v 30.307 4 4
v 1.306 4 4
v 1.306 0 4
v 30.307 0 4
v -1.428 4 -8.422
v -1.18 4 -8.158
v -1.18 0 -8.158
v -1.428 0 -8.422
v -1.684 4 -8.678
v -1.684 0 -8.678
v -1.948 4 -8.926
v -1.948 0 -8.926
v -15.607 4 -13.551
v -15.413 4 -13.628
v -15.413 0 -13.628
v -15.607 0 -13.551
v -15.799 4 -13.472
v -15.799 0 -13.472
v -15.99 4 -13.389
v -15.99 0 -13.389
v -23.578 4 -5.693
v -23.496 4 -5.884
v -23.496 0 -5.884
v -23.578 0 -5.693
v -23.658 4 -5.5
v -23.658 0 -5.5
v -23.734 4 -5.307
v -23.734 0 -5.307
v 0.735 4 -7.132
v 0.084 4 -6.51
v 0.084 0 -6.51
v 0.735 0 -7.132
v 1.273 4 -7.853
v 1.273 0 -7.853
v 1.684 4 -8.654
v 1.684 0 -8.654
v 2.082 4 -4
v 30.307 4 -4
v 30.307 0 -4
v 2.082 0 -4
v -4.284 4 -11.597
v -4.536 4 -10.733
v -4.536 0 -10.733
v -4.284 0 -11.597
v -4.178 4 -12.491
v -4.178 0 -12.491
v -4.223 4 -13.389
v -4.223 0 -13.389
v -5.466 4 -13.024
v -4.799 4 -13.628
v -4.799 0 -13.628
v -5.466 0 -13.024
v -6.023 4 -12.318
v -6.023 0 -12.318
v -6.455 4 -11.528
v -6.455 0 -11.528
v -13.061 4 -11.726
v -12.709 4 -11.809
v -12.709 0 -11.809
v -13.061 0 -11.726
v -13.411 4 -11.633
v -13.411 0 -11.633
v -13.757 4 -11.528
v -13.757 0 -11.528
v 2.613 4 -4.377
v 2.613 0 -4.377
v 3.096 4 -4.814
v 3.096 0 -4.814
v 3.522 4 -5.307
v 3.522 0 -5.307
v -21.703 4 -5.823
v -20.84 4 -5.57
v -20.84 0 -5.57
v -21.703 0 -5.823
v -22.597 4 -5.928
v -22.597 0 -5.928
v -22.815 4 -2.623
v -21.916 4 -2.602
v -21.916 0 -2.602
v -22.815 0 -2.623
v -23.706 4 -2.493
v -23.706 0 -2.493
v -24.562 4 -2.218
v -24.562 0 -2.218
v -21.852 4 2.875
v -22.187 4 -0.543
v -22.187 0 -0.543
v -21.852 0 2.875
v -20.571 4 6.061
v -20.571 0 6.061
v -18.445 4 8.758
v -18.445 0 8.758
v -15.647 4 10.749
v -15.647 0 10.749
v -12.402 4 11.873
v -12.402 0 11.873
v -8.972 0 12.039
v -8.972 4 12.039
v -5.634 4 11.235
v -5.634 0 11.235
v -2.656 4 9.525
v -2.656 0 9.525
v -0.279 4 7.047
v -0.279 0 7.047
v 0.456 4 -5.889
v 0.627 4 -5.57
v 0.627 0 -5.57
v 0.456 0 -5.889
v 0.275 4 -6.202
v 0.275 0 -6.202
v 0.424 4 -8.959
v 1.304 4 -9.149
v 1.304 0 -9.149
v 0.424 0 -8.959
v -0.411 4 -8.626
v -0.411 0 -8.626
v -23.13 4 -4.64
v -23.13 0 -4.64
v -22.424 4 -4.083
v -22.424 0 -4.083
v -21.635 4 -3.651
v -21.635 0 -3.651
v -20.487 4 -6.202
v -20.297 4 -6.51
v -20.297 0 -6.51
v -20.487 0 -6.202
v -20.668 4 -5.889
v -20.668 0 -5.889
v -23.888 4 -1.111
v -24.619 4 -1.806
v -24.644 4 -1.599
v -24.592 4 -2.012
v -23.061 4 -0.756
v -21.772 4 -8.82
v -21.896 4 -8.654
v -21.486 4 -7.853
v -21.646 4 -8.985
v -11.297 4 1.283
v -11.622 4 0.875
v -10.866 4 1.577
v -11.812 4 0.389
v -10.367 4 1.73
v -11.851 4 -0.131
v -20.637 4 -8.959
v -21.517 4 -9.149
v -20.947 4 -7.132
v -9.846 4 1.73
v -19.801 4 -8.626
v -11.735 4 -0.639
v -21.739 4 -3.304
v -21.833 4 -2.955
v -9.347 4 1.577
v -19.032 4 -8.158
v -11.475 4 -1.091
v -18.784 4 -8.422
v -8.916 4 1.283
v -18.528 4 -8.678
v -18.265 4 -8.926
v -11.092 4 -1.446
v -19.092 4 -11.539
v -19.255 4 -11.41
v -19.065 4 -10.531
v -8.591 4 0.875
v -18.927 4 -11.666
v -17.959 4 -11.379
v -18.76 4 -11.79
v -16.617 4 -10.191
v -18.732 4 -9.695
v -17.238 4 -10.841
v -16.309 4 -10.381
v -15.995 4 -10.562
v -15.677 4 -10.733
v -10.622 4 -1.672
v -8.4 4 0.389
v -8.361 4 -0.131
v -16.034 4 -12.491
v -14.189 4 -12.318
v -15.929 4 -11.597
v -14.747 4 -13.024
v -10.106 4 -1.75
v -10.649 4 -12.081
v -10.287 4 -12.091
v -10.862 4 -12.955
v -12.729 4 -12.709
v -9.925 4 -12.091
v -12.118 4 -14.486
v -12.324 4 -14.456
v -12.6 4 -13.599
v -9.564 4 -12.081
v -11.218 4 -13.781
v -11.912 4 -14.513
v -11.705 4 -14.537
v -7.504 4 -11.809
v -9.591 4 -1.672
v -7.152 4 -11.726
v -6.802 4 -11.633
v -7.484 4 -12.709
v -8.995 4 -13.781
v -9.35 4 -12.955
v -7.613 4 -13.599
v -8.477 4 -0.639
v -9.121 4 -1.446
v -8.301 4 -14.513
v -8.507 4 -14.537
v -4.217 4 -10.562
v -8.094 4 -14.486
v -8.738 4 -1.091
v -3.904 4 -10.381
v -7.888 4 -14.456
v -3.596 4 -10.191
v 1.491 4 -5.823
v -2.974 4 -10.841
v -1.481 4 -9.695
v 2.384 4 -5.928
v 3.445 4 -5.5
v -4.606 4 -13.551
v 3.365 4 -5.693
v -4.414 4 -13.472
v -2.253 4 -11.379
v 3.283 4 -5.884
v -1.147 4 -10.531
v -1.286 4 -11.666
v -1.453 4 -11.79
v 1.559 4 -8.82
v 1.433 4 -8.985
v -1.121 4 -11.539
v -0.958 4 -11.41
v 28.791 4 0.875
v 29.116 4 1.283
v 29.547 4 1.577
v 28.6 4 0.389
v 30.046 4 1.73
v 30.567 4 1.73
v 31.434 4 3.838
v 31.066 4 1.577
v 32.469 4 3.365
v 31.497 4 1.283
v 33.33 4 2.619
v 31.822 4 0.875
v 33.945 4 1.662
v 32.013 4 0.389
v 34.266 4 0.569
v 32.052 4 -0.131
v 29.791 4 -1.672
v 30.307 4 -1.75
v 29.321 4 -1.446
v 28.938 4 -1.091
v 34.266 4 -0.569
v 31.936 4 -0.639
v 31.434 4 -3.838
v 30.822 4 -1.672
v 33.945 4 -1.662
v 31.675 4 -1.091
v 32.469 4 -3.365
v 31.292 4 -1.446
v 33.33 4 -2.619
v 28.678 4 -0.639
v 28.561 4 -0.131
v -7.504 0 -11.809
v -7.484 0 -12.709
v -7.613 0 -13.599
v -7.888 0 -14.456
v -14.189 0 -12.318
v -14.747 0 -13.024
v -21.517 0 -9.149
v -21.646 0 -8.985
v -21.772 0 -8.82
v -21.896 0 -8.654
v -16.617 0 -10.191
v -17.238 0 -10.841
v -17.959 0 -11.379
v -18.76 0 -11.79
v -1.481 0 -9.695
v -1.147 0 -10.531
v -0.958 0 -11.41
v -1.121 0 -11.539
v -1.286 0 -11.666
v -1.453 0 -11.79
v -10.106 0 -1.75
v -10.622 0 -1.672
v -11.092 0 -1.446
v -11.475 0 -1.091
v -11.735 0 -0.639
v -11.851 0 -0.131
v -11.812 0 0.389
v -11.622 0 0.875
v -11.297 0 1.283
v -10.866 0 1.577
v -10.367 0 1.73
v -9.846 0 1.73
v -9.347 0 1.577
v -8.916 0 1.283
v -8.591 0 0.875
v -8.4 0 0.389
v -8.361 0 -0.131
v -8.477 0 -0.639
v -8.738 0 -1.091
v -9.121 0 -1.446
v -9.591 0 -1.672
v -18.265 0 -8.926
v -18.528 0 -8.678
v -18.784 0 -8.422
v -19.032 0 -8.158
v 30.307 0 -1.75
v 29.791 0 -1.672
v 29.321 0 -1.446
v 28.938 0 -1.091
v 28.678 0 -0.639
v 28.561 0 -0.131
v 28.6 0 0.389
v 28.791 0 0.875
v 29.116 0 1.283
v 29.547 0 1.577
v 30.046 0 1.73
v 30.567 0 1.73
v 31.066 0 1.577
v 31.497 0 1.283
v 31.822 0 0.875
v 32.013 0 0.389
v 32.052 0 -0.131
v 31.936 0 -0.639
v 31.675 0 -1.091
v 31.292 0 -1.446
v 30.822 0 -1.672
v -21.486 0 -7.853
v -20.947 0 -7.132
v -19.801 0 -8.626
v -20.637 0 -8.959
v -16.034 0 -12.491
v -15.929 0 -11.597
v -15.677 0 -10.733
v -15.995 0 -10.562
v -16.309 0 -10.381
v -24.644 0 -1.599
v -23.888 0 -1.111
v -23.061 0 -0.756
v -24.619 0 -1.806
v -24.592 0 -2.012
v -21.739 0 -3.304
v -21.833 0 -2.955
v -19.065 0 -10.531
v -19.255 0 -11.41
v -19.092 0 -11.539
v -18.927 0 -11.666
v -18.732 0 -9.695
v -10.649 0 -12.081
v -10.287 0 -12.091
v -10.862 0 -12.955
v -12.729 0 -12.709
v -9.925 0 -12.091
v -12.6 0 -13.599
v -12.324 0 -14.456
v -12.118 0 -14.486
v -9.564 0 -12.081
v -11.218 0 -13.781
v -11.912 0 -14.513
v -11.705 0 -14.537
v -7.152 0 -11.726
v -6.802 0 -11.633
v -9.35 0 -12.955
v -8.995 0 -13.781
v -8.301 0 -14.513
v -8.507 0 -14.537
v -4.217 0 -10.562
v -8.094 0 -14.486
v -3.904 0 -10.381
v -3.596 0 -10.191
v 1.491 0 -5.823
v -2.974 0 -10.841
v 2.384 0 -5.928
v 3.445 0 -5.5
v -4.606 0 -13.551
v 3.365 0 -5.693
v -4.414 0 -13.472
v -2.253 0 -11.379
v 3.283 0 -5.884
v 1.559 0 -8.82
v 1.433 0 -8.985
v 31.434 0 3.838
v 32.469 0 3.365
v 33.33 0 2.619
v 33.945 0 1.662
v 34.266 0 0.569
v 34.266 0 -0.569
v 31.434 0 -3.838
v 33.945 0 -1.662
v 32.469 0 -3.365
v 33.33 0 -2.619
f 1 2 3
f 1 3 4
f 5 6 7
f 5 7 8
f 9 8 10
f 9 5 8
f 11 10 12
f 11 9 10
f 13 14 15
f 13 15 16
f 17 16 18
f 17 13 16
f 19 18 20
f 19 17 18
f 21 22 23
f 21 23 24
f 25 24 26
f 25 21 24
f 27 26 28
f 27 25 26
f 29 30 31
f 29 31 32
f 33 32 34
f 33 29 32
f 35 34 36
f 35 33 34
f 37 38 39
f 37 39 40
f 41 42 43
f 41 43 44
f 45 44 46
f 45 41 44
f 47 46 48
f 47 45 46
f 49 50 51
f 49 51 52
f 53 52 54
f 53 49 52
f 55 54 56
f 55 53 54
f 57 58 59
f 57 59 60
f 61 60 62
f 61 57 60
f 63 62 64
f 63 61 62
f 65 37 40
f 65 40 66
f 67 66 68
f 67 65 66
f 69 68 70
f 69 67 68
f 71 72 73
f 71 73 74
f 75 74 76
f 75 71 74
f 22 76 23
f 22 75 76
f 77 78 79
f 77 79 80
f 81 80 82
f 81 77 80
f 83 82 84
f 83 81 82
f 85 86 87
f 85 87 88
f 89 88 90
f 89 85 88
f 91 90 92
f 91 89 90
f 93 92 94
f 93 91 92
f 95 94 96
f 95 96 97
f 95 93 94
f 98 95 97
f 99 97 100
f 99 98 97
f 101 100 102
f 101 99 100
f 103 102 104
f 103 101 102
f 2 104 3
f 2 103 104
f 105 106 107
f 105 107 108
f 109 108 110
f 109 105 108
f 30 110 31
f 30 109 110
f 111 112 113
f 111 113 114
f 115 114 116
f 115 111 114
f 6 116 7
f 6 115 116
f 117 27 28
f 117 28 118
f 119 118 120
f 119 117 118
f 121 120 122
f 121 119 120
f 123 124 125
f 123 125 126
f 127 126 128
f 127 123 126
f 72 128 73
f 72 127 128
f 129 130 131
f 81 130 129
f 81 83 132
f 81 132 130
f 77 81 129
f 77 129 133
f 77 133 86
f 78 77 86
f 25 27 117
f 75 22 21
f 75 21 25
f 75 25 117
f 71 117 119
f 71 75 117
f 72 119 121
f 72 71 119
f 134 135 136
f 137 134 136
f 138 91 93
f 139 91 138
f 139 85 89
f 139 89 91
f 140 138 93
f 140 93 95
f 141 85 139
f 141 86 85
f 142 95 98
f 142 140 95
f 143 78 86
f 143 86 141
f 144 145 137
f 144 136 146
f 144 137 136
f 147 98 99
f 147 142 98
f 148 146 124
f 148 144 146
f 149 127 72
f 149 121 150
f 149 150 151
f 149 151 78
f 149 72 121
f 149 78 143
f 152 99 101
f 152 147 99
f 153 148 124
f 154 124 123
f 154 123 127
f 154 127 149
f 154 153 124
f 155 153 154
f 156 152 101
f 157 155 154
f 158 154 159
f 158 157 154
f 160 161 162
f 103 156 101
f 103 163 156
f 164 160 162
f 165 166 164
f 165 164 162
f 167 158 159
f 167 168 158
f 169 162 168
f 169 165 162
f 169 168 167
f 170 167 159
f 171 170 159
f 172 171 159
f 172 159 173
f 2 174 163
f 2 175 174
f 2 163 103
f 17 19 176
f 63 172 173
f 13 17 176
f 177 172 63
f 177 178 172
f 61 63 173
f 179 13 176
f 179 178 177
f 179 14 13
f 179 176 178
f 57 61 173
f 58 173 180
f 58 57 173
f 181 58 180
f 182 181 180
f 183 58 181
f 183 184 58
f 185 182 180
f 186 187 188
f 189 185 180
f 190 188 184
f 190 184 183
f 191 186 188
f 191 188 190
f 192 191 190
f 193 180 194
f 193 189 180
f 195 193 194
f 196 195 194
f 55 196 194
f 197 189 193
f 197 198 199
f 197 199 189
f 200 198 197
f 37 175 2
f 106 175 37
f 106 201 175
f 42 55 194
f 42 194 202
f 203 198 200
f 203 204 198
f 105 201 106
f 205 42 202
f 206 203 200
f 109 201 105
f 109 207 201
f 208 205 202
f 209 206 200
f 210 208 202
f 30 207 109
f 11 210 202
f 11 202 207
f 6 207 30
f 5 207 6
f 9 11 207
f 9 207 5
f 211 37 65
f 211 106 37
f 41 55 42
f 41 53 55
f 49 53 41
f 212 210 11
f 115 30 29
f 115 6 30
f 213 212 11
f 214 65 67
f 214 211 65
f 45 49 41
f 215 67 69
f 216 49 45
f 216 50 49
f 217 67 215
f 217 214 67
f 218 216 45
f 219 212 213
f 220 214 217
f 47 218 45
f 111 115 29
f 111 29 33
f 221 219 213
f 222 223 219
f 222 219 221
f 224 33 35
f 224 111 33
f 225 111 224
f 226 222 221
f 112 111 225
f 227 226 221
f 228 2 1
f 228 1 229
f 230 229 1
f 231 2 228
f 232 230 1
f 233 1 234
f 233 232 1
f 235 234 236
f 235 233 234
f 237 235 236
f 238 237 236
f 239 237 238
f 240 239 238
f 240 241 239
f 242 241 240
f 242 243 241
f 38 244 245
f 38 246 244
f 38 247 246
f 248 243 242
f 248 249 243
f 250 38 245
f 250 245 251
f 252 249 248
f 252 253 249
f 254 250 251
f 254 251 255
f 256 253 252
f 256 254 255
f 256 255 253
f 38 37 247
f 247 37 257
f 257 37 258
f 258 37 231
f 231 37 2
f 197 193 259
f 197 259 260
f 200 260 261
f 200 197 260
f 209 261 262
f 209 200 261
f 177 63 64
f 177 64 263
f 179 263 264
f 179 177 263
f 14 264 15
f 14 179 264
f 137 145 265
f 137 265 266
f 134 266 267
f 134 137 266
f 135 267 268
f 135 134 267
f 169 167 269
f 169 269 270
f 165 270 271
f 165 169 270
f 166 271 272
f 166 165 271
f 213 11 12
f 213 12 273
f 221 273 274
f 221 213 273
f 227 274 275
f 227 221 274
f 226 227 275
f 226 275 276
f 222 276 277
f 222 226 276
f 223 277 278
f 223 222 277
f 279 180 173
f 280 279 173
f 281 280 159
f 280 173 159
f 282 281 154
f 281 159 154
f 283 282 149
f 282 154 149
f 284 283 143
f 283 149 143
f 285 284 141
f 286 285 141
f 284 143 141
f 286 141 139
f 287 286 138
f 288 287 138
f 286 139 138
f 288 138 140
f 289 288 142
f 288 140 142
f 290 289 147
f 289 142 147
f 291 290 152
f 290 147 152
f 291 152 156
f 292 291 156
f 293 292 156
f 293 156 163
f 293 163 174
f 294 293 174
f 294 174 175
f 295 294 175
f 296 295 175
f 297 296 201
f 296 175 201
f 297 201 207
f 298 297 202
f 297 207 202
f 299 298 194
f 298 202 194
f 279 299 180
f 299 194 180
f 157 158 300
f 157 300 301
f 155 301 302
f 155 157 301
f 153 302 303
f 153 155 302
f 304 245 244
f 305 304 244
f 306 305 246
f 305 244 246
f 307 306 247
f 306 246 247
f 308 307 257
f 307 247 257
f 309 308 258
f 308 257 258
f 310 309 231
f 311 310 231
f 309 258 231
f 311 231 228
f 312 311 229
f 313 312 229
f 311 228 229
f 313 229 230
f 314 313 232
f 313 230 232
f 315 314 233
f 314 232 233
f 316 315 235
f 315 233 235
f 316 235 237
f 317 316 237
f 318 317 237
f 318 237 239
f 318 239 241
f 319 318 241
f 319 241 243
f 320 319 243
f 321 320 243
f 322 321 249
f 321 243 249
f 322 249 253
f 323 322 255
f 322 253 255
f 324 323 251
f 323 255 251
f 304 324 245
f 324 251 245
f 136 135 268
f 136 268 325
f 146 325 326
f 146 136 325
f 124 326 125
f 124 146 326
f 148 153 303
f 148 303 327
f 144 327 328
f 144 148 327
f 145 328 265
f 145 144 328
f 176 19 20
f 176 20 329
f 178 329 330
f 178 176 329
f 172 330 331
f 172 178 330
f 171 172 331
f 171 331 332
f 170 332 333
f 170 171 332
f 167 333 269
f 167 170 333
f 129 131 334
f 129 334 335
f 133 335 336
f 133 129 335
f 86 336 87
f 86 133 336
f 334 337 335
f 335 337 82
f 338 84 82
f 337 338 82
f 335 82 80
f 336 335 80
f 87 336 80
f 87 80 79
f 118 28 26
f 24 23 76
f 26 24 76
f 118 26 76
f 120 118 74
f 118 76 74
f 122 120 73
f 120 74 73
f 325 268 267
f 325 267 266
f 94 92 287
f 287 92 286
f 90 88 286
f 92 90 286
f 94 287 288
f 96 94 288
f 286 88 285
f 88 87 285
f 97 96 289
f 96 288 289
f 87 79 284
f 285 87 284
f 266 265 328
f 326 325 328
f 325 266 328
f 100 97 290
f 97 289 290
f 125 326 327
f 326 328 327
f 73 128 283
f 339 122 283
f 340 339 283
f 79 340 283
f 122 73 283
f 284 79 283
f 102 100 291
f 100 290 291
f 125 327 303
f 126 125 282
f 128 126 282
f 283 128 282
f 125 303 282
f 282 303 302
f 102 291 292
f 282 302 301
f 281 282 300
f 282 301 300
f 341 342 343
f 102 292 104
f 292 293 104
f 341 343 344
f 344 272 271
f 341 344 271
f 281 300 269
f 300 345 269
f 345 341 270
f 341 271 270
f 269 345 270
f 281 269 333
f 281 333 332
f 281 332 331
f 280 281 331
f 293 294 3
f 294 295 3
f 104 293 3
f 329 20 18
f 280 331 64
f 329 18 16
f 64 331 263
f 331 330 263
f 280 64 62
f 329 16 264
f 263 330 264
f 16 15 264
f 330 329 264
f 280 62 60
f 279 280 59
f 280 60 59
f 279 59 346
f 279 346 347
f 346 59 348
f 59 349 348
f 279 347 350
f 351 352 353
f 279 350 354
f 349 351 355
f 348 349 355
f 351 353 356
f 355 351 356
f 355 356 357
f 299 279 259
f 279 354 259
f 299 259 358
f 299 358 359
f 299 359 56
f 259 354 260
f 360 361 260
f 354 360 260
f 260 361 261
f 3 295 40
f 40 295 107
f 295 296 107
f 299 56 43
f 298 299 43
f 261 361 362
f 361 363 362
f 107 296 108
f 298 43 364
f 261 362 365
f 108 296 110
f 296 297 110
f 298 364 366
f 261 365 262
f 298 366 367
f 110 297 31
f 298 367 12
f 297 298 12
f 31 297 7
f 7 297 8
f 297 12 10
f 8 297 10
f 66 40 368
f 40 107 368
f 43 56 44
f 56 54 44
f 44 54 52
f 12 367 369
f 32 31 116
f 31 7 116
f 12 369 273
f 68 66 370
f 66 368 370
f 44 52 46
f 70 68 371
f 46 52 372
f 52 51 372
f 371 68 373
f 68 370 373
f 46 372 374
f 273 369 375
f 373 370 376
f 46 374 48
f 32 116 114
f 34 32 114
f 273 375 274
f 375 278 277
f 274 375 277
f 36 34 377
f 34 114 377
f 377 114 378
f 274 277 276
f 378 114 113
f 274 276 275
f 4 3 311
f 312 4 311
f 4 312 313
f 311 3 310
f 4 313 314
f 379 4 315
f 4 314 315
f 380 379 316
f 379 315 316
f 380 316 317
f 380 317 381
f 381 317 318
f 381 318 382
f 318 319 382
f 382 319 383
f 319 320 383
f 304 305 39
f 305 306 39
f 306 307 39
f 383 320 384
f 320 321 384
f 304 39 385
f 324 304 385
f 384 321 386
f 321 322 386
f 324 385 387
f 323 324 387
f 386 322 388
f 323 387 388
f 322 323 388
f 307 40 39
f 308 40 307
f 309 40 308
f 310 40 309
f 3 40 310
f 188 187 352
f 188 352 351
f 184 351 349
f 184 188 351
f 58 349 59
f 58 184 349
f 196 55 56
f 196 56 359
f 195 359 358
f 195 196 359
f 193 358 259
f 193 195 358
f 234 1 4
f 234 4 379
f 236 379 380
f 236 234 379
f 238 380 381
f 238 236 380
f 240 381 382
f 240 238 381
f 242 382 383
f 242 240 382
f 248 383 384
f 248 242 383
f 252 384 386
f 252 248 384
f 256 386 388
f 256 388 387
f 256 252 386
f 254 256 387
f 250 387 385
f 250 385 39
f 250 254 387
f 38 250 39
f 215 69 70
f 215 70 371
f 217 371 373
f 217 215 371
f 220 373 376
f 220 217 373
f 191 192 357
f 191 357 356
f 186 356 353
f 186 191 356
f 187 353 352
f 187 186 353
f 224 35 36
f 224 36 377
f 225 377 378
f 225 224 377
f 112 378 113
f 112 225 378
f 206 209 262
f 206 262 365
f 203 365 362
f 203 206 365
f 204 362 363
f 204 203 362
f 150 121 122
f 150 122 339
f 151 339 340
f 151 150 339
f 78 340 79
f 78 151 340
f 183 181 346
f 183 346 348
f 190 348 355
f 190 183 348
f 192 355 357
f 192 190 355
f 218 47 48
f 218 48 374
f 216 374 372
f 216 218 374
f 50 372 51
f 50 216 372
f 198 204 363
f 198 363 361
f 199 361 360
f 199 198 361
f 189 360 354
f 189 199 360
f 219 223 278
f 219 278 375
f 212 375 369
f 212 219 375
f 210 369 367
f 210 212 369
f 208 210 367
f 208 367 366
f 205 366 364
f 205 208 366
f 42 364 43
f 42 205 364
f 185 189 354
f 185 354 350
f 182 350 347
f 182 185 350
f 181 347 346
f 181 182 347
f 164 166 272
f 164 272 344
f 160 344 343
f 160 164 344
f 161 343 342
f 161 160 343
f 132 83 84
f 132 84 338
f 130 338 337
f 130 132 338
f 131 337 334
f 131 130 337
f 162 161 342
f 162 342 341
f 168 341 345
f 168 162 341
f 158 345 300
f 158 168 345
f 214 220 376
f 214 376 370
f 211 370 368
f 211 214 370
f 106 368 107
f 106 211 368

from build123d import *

# Parameters (mm, degrees)
SKETCH1_R           = 1.75
BOSS_EXTRUDE1_DEPTH = 4


with BuildPart() as part:
    # Sketch1 → Boss-Extrude1 (new body)
    with BuildSketch(Plane(origin=(0, 4, 0), x_dir=(1, 0, 0), z_dir=(0, 1, 0))):
        with BuildLine():
            Line((1.305695063, -4), (30.3065745, -4))
            ThreePointArc((30.3065745, -4), (34.3065745, 0), (30.3065745, 4))
            Line((30.3065745, 4), (2.081641936, 4))
            ThreePointArc((2.081641936, 4), (2.861028333, 4.588201733), (3.521749436, 5.30713988))
            ThreePointArc((3.521749436, 5.30713988), (3.405395609, 5.596745198), (3.282888305, 5.883801663))
            ThreePointArc((3.282888305, 5.883801663), (1.93527598, 5.894040025), (0.627094961, 5.57027124))
            ThreePointArc((0.627094961, 5.57027124), (0.366286148, 6.046375), (0.084372603, 6.510293938))
            ThreePointArc((0.084372603, 6.510293938), (1.018855105, 7.48132754), (1.683794586, 8.65351323))
            ThreePointArc((1.683794586, 8.65351323), (1.496450048, 8.903135899), (1.303821399, 9.148703928))
            ThreePointArc((1.303821399, 9.148703928), (-0.000522033, 8.809805691), (-1.180330337, 8.158486898))
            ThreePointArc((-1.180330337, 8.158486898), (-1.555477026, 8.550865528), (-1.947855656, 8.926012217))
            ThreePointArc((-1.947855656, 8.926012217), (-1.296536862, 10.105820521), (-0.957638625, 11.410163953))
            ThreePointArc((-0.957638625, 11.410163953), (-1.203206655, 11.602792602), (-1.452829324, 11.79013714))
            ThreePointArc((-1.452829324, 11.79013714), (-2.625015014, 11.125197659), (-3.596048616, 10.190715157))
            ThreePointArc((-3.596048616, 10.190715157), (-4.059967554, 10.472628702), (-4.536071314, 10.733437515))
            ThreePointArc((-4.536071314, 10.733437515), (-4.212302529, 12.041618533), (-4.222540891, 13.389230859))
            ThreePointArc((-4.222540891, 13.389230859), (-4.509597355, 13.511738163), (-4.799202674, 13.62809199))
            ThreePointArc((-4.799202674, 13.62809199), (-5.759348103, 12.682425791), (-6.455432668, 11.528463019))
            ThreePointArc((-6.455432668, 11.528463019), (-6.976508546, 11.680699536), (-7.503891752, 11.809396783))
            ThreePointArc((-7.503891752, 11.809396783), (-7.529737283, 13.156800143), (-7.888414517, 14.455843809))
            ThreePointArc((-7.888414517, 14.455843809), (-8.197396993, 14.499881098), (-8.507248835, 14.537314892))
            ThreePointArc((-8.507248835, 14.537314892), (-9.18992168, 13.375367565), (-9.563620196, 12.080565177))
            ThreePointArc((-9.563620196, 12.080565177), (-10.106342554, 12.09275), (-10.649064912, 12.080565177))
            ThreePointArc((-10.649064912, 12.080565177), (-11.022763428, 13.375367565), (-11.705436272, 14.537314892))
            ThreePointArc((-11.705436272, 14.537314892), (-12.015288115, 14.499881098), (-12.324270591, 14.455843809))
            ThreePointArc((-12.324270591, 14.455843809), (-12.682947825, 13.156800143), (-12.708793355, 11.809396783))
            ThreePointArc((-12.708793355, 11.809396783), (-13.236176561, 11.680699536), (-13.757252439, 11.528463019))
            ThreePointArc((-13.757252439, 11.528463019), (-14.453337005, 12.682425791), (-15.413482434, 13.62809199))
            ThreePointArc((-15.413482434, 13.62809199), (-15.703087752, 13.511738163), (-15.990144217, 13.389230859))
            ThreePointArc((-15.990144217, 13.389230859), (-16.000382579, 12.041618533), (-15.676613793, 10.733437515))
            ThreePointArc((-15.676613793, 10.733437515), (-16.152717554, 10.472628702), (-16.616636492, 10.190715157))
            ThreePointArc((-16.616636492, 10.190715157), (-17.587670094, 11.125197659), (-18.759855783, 11.79013714))
            ThreePointArc((-18.759855783, 11.79013714), (-19.009478453, 11.602792602), (-19.255046482, 11.410163953))
            ThreePointArc((-19.255046482, 11.410163953), (-18.916148245, 10.105820521), (-18.264829452, 8.926012217))
            ThreePointArc((-18.264829452, 8.926012217), (-18.657208082, 8.550865528), (-19.032354771, 8.158486898))
            ThreePointArc((-19.032354771, 8.158486898), (-20.212163074, 8.809805691), (-21.516506507, 9.148703928))
            ThreePointArc((-21.516506507, 9.148703928), (-21.709135156, 8.903135899), (-21.896479694, 8.65351323))
            ThreePointArc((-21.896479694, 8.65351323), (-21.231540213, 7.48132754), (-20.297057711, 6.510293938))
            ThreePointArc((-20.297057711, 6.510293938), (-20.578971255, 6.046375), (-20.839780068, 5.57027124))
            ThreePointArc((-20.839780068, 5.57027124), (-22.147961087, 5.894040025), (-23.495573413, 5.883801663))
            ThreePointArc((-23.495573413, 5.883801663), (-23.618080717, 5.596745198), (-23.734434544, 5.30713988))
            ThreePointArc((-23.734434544, 5.30713988), (-22.788768345, 4.346994451), (-21.634805572, 3.650909885))
            ThreePointArc((-21.634805572, 3.650909885), (-21.78704209, 3.129834008), (-21.915739337, 2.602450802))
            ThreePointArc((-21.915739337, 2.602450802), (-23.263142697, 2.576605271), (-24.562186363, 2.217928037))
            ThreePointArc((-24.562186363, 2.217928037), (-24.606223651, 1.908945561), (-24.643657446, 1.599093719))
            ThreePointArc((-24.643657446, 1.599093719), (-23.481710119, 0.916420874), (-22.186907731, 0.542722358))
            ThreePointArc((-22.186907731, 0.542722358), (-12.402167869, -11.872817218), (1.305695063, -4))
        make_face()
        with Locations(Location((30.3065745, 0, 0), (0, 0, 90))):
            Circle(SKETCH1_R, mode=Mode.SUBTRACT)
        with Locations(Location((-10.106342554, 0, 0), (0, 0, 90))):
            Circle(SKETCH1_R, mode=Mode.SUBTRACT)
    extrude(amount=-BOSS_EXTRUDE1_DEPTH)


solid = part.part
